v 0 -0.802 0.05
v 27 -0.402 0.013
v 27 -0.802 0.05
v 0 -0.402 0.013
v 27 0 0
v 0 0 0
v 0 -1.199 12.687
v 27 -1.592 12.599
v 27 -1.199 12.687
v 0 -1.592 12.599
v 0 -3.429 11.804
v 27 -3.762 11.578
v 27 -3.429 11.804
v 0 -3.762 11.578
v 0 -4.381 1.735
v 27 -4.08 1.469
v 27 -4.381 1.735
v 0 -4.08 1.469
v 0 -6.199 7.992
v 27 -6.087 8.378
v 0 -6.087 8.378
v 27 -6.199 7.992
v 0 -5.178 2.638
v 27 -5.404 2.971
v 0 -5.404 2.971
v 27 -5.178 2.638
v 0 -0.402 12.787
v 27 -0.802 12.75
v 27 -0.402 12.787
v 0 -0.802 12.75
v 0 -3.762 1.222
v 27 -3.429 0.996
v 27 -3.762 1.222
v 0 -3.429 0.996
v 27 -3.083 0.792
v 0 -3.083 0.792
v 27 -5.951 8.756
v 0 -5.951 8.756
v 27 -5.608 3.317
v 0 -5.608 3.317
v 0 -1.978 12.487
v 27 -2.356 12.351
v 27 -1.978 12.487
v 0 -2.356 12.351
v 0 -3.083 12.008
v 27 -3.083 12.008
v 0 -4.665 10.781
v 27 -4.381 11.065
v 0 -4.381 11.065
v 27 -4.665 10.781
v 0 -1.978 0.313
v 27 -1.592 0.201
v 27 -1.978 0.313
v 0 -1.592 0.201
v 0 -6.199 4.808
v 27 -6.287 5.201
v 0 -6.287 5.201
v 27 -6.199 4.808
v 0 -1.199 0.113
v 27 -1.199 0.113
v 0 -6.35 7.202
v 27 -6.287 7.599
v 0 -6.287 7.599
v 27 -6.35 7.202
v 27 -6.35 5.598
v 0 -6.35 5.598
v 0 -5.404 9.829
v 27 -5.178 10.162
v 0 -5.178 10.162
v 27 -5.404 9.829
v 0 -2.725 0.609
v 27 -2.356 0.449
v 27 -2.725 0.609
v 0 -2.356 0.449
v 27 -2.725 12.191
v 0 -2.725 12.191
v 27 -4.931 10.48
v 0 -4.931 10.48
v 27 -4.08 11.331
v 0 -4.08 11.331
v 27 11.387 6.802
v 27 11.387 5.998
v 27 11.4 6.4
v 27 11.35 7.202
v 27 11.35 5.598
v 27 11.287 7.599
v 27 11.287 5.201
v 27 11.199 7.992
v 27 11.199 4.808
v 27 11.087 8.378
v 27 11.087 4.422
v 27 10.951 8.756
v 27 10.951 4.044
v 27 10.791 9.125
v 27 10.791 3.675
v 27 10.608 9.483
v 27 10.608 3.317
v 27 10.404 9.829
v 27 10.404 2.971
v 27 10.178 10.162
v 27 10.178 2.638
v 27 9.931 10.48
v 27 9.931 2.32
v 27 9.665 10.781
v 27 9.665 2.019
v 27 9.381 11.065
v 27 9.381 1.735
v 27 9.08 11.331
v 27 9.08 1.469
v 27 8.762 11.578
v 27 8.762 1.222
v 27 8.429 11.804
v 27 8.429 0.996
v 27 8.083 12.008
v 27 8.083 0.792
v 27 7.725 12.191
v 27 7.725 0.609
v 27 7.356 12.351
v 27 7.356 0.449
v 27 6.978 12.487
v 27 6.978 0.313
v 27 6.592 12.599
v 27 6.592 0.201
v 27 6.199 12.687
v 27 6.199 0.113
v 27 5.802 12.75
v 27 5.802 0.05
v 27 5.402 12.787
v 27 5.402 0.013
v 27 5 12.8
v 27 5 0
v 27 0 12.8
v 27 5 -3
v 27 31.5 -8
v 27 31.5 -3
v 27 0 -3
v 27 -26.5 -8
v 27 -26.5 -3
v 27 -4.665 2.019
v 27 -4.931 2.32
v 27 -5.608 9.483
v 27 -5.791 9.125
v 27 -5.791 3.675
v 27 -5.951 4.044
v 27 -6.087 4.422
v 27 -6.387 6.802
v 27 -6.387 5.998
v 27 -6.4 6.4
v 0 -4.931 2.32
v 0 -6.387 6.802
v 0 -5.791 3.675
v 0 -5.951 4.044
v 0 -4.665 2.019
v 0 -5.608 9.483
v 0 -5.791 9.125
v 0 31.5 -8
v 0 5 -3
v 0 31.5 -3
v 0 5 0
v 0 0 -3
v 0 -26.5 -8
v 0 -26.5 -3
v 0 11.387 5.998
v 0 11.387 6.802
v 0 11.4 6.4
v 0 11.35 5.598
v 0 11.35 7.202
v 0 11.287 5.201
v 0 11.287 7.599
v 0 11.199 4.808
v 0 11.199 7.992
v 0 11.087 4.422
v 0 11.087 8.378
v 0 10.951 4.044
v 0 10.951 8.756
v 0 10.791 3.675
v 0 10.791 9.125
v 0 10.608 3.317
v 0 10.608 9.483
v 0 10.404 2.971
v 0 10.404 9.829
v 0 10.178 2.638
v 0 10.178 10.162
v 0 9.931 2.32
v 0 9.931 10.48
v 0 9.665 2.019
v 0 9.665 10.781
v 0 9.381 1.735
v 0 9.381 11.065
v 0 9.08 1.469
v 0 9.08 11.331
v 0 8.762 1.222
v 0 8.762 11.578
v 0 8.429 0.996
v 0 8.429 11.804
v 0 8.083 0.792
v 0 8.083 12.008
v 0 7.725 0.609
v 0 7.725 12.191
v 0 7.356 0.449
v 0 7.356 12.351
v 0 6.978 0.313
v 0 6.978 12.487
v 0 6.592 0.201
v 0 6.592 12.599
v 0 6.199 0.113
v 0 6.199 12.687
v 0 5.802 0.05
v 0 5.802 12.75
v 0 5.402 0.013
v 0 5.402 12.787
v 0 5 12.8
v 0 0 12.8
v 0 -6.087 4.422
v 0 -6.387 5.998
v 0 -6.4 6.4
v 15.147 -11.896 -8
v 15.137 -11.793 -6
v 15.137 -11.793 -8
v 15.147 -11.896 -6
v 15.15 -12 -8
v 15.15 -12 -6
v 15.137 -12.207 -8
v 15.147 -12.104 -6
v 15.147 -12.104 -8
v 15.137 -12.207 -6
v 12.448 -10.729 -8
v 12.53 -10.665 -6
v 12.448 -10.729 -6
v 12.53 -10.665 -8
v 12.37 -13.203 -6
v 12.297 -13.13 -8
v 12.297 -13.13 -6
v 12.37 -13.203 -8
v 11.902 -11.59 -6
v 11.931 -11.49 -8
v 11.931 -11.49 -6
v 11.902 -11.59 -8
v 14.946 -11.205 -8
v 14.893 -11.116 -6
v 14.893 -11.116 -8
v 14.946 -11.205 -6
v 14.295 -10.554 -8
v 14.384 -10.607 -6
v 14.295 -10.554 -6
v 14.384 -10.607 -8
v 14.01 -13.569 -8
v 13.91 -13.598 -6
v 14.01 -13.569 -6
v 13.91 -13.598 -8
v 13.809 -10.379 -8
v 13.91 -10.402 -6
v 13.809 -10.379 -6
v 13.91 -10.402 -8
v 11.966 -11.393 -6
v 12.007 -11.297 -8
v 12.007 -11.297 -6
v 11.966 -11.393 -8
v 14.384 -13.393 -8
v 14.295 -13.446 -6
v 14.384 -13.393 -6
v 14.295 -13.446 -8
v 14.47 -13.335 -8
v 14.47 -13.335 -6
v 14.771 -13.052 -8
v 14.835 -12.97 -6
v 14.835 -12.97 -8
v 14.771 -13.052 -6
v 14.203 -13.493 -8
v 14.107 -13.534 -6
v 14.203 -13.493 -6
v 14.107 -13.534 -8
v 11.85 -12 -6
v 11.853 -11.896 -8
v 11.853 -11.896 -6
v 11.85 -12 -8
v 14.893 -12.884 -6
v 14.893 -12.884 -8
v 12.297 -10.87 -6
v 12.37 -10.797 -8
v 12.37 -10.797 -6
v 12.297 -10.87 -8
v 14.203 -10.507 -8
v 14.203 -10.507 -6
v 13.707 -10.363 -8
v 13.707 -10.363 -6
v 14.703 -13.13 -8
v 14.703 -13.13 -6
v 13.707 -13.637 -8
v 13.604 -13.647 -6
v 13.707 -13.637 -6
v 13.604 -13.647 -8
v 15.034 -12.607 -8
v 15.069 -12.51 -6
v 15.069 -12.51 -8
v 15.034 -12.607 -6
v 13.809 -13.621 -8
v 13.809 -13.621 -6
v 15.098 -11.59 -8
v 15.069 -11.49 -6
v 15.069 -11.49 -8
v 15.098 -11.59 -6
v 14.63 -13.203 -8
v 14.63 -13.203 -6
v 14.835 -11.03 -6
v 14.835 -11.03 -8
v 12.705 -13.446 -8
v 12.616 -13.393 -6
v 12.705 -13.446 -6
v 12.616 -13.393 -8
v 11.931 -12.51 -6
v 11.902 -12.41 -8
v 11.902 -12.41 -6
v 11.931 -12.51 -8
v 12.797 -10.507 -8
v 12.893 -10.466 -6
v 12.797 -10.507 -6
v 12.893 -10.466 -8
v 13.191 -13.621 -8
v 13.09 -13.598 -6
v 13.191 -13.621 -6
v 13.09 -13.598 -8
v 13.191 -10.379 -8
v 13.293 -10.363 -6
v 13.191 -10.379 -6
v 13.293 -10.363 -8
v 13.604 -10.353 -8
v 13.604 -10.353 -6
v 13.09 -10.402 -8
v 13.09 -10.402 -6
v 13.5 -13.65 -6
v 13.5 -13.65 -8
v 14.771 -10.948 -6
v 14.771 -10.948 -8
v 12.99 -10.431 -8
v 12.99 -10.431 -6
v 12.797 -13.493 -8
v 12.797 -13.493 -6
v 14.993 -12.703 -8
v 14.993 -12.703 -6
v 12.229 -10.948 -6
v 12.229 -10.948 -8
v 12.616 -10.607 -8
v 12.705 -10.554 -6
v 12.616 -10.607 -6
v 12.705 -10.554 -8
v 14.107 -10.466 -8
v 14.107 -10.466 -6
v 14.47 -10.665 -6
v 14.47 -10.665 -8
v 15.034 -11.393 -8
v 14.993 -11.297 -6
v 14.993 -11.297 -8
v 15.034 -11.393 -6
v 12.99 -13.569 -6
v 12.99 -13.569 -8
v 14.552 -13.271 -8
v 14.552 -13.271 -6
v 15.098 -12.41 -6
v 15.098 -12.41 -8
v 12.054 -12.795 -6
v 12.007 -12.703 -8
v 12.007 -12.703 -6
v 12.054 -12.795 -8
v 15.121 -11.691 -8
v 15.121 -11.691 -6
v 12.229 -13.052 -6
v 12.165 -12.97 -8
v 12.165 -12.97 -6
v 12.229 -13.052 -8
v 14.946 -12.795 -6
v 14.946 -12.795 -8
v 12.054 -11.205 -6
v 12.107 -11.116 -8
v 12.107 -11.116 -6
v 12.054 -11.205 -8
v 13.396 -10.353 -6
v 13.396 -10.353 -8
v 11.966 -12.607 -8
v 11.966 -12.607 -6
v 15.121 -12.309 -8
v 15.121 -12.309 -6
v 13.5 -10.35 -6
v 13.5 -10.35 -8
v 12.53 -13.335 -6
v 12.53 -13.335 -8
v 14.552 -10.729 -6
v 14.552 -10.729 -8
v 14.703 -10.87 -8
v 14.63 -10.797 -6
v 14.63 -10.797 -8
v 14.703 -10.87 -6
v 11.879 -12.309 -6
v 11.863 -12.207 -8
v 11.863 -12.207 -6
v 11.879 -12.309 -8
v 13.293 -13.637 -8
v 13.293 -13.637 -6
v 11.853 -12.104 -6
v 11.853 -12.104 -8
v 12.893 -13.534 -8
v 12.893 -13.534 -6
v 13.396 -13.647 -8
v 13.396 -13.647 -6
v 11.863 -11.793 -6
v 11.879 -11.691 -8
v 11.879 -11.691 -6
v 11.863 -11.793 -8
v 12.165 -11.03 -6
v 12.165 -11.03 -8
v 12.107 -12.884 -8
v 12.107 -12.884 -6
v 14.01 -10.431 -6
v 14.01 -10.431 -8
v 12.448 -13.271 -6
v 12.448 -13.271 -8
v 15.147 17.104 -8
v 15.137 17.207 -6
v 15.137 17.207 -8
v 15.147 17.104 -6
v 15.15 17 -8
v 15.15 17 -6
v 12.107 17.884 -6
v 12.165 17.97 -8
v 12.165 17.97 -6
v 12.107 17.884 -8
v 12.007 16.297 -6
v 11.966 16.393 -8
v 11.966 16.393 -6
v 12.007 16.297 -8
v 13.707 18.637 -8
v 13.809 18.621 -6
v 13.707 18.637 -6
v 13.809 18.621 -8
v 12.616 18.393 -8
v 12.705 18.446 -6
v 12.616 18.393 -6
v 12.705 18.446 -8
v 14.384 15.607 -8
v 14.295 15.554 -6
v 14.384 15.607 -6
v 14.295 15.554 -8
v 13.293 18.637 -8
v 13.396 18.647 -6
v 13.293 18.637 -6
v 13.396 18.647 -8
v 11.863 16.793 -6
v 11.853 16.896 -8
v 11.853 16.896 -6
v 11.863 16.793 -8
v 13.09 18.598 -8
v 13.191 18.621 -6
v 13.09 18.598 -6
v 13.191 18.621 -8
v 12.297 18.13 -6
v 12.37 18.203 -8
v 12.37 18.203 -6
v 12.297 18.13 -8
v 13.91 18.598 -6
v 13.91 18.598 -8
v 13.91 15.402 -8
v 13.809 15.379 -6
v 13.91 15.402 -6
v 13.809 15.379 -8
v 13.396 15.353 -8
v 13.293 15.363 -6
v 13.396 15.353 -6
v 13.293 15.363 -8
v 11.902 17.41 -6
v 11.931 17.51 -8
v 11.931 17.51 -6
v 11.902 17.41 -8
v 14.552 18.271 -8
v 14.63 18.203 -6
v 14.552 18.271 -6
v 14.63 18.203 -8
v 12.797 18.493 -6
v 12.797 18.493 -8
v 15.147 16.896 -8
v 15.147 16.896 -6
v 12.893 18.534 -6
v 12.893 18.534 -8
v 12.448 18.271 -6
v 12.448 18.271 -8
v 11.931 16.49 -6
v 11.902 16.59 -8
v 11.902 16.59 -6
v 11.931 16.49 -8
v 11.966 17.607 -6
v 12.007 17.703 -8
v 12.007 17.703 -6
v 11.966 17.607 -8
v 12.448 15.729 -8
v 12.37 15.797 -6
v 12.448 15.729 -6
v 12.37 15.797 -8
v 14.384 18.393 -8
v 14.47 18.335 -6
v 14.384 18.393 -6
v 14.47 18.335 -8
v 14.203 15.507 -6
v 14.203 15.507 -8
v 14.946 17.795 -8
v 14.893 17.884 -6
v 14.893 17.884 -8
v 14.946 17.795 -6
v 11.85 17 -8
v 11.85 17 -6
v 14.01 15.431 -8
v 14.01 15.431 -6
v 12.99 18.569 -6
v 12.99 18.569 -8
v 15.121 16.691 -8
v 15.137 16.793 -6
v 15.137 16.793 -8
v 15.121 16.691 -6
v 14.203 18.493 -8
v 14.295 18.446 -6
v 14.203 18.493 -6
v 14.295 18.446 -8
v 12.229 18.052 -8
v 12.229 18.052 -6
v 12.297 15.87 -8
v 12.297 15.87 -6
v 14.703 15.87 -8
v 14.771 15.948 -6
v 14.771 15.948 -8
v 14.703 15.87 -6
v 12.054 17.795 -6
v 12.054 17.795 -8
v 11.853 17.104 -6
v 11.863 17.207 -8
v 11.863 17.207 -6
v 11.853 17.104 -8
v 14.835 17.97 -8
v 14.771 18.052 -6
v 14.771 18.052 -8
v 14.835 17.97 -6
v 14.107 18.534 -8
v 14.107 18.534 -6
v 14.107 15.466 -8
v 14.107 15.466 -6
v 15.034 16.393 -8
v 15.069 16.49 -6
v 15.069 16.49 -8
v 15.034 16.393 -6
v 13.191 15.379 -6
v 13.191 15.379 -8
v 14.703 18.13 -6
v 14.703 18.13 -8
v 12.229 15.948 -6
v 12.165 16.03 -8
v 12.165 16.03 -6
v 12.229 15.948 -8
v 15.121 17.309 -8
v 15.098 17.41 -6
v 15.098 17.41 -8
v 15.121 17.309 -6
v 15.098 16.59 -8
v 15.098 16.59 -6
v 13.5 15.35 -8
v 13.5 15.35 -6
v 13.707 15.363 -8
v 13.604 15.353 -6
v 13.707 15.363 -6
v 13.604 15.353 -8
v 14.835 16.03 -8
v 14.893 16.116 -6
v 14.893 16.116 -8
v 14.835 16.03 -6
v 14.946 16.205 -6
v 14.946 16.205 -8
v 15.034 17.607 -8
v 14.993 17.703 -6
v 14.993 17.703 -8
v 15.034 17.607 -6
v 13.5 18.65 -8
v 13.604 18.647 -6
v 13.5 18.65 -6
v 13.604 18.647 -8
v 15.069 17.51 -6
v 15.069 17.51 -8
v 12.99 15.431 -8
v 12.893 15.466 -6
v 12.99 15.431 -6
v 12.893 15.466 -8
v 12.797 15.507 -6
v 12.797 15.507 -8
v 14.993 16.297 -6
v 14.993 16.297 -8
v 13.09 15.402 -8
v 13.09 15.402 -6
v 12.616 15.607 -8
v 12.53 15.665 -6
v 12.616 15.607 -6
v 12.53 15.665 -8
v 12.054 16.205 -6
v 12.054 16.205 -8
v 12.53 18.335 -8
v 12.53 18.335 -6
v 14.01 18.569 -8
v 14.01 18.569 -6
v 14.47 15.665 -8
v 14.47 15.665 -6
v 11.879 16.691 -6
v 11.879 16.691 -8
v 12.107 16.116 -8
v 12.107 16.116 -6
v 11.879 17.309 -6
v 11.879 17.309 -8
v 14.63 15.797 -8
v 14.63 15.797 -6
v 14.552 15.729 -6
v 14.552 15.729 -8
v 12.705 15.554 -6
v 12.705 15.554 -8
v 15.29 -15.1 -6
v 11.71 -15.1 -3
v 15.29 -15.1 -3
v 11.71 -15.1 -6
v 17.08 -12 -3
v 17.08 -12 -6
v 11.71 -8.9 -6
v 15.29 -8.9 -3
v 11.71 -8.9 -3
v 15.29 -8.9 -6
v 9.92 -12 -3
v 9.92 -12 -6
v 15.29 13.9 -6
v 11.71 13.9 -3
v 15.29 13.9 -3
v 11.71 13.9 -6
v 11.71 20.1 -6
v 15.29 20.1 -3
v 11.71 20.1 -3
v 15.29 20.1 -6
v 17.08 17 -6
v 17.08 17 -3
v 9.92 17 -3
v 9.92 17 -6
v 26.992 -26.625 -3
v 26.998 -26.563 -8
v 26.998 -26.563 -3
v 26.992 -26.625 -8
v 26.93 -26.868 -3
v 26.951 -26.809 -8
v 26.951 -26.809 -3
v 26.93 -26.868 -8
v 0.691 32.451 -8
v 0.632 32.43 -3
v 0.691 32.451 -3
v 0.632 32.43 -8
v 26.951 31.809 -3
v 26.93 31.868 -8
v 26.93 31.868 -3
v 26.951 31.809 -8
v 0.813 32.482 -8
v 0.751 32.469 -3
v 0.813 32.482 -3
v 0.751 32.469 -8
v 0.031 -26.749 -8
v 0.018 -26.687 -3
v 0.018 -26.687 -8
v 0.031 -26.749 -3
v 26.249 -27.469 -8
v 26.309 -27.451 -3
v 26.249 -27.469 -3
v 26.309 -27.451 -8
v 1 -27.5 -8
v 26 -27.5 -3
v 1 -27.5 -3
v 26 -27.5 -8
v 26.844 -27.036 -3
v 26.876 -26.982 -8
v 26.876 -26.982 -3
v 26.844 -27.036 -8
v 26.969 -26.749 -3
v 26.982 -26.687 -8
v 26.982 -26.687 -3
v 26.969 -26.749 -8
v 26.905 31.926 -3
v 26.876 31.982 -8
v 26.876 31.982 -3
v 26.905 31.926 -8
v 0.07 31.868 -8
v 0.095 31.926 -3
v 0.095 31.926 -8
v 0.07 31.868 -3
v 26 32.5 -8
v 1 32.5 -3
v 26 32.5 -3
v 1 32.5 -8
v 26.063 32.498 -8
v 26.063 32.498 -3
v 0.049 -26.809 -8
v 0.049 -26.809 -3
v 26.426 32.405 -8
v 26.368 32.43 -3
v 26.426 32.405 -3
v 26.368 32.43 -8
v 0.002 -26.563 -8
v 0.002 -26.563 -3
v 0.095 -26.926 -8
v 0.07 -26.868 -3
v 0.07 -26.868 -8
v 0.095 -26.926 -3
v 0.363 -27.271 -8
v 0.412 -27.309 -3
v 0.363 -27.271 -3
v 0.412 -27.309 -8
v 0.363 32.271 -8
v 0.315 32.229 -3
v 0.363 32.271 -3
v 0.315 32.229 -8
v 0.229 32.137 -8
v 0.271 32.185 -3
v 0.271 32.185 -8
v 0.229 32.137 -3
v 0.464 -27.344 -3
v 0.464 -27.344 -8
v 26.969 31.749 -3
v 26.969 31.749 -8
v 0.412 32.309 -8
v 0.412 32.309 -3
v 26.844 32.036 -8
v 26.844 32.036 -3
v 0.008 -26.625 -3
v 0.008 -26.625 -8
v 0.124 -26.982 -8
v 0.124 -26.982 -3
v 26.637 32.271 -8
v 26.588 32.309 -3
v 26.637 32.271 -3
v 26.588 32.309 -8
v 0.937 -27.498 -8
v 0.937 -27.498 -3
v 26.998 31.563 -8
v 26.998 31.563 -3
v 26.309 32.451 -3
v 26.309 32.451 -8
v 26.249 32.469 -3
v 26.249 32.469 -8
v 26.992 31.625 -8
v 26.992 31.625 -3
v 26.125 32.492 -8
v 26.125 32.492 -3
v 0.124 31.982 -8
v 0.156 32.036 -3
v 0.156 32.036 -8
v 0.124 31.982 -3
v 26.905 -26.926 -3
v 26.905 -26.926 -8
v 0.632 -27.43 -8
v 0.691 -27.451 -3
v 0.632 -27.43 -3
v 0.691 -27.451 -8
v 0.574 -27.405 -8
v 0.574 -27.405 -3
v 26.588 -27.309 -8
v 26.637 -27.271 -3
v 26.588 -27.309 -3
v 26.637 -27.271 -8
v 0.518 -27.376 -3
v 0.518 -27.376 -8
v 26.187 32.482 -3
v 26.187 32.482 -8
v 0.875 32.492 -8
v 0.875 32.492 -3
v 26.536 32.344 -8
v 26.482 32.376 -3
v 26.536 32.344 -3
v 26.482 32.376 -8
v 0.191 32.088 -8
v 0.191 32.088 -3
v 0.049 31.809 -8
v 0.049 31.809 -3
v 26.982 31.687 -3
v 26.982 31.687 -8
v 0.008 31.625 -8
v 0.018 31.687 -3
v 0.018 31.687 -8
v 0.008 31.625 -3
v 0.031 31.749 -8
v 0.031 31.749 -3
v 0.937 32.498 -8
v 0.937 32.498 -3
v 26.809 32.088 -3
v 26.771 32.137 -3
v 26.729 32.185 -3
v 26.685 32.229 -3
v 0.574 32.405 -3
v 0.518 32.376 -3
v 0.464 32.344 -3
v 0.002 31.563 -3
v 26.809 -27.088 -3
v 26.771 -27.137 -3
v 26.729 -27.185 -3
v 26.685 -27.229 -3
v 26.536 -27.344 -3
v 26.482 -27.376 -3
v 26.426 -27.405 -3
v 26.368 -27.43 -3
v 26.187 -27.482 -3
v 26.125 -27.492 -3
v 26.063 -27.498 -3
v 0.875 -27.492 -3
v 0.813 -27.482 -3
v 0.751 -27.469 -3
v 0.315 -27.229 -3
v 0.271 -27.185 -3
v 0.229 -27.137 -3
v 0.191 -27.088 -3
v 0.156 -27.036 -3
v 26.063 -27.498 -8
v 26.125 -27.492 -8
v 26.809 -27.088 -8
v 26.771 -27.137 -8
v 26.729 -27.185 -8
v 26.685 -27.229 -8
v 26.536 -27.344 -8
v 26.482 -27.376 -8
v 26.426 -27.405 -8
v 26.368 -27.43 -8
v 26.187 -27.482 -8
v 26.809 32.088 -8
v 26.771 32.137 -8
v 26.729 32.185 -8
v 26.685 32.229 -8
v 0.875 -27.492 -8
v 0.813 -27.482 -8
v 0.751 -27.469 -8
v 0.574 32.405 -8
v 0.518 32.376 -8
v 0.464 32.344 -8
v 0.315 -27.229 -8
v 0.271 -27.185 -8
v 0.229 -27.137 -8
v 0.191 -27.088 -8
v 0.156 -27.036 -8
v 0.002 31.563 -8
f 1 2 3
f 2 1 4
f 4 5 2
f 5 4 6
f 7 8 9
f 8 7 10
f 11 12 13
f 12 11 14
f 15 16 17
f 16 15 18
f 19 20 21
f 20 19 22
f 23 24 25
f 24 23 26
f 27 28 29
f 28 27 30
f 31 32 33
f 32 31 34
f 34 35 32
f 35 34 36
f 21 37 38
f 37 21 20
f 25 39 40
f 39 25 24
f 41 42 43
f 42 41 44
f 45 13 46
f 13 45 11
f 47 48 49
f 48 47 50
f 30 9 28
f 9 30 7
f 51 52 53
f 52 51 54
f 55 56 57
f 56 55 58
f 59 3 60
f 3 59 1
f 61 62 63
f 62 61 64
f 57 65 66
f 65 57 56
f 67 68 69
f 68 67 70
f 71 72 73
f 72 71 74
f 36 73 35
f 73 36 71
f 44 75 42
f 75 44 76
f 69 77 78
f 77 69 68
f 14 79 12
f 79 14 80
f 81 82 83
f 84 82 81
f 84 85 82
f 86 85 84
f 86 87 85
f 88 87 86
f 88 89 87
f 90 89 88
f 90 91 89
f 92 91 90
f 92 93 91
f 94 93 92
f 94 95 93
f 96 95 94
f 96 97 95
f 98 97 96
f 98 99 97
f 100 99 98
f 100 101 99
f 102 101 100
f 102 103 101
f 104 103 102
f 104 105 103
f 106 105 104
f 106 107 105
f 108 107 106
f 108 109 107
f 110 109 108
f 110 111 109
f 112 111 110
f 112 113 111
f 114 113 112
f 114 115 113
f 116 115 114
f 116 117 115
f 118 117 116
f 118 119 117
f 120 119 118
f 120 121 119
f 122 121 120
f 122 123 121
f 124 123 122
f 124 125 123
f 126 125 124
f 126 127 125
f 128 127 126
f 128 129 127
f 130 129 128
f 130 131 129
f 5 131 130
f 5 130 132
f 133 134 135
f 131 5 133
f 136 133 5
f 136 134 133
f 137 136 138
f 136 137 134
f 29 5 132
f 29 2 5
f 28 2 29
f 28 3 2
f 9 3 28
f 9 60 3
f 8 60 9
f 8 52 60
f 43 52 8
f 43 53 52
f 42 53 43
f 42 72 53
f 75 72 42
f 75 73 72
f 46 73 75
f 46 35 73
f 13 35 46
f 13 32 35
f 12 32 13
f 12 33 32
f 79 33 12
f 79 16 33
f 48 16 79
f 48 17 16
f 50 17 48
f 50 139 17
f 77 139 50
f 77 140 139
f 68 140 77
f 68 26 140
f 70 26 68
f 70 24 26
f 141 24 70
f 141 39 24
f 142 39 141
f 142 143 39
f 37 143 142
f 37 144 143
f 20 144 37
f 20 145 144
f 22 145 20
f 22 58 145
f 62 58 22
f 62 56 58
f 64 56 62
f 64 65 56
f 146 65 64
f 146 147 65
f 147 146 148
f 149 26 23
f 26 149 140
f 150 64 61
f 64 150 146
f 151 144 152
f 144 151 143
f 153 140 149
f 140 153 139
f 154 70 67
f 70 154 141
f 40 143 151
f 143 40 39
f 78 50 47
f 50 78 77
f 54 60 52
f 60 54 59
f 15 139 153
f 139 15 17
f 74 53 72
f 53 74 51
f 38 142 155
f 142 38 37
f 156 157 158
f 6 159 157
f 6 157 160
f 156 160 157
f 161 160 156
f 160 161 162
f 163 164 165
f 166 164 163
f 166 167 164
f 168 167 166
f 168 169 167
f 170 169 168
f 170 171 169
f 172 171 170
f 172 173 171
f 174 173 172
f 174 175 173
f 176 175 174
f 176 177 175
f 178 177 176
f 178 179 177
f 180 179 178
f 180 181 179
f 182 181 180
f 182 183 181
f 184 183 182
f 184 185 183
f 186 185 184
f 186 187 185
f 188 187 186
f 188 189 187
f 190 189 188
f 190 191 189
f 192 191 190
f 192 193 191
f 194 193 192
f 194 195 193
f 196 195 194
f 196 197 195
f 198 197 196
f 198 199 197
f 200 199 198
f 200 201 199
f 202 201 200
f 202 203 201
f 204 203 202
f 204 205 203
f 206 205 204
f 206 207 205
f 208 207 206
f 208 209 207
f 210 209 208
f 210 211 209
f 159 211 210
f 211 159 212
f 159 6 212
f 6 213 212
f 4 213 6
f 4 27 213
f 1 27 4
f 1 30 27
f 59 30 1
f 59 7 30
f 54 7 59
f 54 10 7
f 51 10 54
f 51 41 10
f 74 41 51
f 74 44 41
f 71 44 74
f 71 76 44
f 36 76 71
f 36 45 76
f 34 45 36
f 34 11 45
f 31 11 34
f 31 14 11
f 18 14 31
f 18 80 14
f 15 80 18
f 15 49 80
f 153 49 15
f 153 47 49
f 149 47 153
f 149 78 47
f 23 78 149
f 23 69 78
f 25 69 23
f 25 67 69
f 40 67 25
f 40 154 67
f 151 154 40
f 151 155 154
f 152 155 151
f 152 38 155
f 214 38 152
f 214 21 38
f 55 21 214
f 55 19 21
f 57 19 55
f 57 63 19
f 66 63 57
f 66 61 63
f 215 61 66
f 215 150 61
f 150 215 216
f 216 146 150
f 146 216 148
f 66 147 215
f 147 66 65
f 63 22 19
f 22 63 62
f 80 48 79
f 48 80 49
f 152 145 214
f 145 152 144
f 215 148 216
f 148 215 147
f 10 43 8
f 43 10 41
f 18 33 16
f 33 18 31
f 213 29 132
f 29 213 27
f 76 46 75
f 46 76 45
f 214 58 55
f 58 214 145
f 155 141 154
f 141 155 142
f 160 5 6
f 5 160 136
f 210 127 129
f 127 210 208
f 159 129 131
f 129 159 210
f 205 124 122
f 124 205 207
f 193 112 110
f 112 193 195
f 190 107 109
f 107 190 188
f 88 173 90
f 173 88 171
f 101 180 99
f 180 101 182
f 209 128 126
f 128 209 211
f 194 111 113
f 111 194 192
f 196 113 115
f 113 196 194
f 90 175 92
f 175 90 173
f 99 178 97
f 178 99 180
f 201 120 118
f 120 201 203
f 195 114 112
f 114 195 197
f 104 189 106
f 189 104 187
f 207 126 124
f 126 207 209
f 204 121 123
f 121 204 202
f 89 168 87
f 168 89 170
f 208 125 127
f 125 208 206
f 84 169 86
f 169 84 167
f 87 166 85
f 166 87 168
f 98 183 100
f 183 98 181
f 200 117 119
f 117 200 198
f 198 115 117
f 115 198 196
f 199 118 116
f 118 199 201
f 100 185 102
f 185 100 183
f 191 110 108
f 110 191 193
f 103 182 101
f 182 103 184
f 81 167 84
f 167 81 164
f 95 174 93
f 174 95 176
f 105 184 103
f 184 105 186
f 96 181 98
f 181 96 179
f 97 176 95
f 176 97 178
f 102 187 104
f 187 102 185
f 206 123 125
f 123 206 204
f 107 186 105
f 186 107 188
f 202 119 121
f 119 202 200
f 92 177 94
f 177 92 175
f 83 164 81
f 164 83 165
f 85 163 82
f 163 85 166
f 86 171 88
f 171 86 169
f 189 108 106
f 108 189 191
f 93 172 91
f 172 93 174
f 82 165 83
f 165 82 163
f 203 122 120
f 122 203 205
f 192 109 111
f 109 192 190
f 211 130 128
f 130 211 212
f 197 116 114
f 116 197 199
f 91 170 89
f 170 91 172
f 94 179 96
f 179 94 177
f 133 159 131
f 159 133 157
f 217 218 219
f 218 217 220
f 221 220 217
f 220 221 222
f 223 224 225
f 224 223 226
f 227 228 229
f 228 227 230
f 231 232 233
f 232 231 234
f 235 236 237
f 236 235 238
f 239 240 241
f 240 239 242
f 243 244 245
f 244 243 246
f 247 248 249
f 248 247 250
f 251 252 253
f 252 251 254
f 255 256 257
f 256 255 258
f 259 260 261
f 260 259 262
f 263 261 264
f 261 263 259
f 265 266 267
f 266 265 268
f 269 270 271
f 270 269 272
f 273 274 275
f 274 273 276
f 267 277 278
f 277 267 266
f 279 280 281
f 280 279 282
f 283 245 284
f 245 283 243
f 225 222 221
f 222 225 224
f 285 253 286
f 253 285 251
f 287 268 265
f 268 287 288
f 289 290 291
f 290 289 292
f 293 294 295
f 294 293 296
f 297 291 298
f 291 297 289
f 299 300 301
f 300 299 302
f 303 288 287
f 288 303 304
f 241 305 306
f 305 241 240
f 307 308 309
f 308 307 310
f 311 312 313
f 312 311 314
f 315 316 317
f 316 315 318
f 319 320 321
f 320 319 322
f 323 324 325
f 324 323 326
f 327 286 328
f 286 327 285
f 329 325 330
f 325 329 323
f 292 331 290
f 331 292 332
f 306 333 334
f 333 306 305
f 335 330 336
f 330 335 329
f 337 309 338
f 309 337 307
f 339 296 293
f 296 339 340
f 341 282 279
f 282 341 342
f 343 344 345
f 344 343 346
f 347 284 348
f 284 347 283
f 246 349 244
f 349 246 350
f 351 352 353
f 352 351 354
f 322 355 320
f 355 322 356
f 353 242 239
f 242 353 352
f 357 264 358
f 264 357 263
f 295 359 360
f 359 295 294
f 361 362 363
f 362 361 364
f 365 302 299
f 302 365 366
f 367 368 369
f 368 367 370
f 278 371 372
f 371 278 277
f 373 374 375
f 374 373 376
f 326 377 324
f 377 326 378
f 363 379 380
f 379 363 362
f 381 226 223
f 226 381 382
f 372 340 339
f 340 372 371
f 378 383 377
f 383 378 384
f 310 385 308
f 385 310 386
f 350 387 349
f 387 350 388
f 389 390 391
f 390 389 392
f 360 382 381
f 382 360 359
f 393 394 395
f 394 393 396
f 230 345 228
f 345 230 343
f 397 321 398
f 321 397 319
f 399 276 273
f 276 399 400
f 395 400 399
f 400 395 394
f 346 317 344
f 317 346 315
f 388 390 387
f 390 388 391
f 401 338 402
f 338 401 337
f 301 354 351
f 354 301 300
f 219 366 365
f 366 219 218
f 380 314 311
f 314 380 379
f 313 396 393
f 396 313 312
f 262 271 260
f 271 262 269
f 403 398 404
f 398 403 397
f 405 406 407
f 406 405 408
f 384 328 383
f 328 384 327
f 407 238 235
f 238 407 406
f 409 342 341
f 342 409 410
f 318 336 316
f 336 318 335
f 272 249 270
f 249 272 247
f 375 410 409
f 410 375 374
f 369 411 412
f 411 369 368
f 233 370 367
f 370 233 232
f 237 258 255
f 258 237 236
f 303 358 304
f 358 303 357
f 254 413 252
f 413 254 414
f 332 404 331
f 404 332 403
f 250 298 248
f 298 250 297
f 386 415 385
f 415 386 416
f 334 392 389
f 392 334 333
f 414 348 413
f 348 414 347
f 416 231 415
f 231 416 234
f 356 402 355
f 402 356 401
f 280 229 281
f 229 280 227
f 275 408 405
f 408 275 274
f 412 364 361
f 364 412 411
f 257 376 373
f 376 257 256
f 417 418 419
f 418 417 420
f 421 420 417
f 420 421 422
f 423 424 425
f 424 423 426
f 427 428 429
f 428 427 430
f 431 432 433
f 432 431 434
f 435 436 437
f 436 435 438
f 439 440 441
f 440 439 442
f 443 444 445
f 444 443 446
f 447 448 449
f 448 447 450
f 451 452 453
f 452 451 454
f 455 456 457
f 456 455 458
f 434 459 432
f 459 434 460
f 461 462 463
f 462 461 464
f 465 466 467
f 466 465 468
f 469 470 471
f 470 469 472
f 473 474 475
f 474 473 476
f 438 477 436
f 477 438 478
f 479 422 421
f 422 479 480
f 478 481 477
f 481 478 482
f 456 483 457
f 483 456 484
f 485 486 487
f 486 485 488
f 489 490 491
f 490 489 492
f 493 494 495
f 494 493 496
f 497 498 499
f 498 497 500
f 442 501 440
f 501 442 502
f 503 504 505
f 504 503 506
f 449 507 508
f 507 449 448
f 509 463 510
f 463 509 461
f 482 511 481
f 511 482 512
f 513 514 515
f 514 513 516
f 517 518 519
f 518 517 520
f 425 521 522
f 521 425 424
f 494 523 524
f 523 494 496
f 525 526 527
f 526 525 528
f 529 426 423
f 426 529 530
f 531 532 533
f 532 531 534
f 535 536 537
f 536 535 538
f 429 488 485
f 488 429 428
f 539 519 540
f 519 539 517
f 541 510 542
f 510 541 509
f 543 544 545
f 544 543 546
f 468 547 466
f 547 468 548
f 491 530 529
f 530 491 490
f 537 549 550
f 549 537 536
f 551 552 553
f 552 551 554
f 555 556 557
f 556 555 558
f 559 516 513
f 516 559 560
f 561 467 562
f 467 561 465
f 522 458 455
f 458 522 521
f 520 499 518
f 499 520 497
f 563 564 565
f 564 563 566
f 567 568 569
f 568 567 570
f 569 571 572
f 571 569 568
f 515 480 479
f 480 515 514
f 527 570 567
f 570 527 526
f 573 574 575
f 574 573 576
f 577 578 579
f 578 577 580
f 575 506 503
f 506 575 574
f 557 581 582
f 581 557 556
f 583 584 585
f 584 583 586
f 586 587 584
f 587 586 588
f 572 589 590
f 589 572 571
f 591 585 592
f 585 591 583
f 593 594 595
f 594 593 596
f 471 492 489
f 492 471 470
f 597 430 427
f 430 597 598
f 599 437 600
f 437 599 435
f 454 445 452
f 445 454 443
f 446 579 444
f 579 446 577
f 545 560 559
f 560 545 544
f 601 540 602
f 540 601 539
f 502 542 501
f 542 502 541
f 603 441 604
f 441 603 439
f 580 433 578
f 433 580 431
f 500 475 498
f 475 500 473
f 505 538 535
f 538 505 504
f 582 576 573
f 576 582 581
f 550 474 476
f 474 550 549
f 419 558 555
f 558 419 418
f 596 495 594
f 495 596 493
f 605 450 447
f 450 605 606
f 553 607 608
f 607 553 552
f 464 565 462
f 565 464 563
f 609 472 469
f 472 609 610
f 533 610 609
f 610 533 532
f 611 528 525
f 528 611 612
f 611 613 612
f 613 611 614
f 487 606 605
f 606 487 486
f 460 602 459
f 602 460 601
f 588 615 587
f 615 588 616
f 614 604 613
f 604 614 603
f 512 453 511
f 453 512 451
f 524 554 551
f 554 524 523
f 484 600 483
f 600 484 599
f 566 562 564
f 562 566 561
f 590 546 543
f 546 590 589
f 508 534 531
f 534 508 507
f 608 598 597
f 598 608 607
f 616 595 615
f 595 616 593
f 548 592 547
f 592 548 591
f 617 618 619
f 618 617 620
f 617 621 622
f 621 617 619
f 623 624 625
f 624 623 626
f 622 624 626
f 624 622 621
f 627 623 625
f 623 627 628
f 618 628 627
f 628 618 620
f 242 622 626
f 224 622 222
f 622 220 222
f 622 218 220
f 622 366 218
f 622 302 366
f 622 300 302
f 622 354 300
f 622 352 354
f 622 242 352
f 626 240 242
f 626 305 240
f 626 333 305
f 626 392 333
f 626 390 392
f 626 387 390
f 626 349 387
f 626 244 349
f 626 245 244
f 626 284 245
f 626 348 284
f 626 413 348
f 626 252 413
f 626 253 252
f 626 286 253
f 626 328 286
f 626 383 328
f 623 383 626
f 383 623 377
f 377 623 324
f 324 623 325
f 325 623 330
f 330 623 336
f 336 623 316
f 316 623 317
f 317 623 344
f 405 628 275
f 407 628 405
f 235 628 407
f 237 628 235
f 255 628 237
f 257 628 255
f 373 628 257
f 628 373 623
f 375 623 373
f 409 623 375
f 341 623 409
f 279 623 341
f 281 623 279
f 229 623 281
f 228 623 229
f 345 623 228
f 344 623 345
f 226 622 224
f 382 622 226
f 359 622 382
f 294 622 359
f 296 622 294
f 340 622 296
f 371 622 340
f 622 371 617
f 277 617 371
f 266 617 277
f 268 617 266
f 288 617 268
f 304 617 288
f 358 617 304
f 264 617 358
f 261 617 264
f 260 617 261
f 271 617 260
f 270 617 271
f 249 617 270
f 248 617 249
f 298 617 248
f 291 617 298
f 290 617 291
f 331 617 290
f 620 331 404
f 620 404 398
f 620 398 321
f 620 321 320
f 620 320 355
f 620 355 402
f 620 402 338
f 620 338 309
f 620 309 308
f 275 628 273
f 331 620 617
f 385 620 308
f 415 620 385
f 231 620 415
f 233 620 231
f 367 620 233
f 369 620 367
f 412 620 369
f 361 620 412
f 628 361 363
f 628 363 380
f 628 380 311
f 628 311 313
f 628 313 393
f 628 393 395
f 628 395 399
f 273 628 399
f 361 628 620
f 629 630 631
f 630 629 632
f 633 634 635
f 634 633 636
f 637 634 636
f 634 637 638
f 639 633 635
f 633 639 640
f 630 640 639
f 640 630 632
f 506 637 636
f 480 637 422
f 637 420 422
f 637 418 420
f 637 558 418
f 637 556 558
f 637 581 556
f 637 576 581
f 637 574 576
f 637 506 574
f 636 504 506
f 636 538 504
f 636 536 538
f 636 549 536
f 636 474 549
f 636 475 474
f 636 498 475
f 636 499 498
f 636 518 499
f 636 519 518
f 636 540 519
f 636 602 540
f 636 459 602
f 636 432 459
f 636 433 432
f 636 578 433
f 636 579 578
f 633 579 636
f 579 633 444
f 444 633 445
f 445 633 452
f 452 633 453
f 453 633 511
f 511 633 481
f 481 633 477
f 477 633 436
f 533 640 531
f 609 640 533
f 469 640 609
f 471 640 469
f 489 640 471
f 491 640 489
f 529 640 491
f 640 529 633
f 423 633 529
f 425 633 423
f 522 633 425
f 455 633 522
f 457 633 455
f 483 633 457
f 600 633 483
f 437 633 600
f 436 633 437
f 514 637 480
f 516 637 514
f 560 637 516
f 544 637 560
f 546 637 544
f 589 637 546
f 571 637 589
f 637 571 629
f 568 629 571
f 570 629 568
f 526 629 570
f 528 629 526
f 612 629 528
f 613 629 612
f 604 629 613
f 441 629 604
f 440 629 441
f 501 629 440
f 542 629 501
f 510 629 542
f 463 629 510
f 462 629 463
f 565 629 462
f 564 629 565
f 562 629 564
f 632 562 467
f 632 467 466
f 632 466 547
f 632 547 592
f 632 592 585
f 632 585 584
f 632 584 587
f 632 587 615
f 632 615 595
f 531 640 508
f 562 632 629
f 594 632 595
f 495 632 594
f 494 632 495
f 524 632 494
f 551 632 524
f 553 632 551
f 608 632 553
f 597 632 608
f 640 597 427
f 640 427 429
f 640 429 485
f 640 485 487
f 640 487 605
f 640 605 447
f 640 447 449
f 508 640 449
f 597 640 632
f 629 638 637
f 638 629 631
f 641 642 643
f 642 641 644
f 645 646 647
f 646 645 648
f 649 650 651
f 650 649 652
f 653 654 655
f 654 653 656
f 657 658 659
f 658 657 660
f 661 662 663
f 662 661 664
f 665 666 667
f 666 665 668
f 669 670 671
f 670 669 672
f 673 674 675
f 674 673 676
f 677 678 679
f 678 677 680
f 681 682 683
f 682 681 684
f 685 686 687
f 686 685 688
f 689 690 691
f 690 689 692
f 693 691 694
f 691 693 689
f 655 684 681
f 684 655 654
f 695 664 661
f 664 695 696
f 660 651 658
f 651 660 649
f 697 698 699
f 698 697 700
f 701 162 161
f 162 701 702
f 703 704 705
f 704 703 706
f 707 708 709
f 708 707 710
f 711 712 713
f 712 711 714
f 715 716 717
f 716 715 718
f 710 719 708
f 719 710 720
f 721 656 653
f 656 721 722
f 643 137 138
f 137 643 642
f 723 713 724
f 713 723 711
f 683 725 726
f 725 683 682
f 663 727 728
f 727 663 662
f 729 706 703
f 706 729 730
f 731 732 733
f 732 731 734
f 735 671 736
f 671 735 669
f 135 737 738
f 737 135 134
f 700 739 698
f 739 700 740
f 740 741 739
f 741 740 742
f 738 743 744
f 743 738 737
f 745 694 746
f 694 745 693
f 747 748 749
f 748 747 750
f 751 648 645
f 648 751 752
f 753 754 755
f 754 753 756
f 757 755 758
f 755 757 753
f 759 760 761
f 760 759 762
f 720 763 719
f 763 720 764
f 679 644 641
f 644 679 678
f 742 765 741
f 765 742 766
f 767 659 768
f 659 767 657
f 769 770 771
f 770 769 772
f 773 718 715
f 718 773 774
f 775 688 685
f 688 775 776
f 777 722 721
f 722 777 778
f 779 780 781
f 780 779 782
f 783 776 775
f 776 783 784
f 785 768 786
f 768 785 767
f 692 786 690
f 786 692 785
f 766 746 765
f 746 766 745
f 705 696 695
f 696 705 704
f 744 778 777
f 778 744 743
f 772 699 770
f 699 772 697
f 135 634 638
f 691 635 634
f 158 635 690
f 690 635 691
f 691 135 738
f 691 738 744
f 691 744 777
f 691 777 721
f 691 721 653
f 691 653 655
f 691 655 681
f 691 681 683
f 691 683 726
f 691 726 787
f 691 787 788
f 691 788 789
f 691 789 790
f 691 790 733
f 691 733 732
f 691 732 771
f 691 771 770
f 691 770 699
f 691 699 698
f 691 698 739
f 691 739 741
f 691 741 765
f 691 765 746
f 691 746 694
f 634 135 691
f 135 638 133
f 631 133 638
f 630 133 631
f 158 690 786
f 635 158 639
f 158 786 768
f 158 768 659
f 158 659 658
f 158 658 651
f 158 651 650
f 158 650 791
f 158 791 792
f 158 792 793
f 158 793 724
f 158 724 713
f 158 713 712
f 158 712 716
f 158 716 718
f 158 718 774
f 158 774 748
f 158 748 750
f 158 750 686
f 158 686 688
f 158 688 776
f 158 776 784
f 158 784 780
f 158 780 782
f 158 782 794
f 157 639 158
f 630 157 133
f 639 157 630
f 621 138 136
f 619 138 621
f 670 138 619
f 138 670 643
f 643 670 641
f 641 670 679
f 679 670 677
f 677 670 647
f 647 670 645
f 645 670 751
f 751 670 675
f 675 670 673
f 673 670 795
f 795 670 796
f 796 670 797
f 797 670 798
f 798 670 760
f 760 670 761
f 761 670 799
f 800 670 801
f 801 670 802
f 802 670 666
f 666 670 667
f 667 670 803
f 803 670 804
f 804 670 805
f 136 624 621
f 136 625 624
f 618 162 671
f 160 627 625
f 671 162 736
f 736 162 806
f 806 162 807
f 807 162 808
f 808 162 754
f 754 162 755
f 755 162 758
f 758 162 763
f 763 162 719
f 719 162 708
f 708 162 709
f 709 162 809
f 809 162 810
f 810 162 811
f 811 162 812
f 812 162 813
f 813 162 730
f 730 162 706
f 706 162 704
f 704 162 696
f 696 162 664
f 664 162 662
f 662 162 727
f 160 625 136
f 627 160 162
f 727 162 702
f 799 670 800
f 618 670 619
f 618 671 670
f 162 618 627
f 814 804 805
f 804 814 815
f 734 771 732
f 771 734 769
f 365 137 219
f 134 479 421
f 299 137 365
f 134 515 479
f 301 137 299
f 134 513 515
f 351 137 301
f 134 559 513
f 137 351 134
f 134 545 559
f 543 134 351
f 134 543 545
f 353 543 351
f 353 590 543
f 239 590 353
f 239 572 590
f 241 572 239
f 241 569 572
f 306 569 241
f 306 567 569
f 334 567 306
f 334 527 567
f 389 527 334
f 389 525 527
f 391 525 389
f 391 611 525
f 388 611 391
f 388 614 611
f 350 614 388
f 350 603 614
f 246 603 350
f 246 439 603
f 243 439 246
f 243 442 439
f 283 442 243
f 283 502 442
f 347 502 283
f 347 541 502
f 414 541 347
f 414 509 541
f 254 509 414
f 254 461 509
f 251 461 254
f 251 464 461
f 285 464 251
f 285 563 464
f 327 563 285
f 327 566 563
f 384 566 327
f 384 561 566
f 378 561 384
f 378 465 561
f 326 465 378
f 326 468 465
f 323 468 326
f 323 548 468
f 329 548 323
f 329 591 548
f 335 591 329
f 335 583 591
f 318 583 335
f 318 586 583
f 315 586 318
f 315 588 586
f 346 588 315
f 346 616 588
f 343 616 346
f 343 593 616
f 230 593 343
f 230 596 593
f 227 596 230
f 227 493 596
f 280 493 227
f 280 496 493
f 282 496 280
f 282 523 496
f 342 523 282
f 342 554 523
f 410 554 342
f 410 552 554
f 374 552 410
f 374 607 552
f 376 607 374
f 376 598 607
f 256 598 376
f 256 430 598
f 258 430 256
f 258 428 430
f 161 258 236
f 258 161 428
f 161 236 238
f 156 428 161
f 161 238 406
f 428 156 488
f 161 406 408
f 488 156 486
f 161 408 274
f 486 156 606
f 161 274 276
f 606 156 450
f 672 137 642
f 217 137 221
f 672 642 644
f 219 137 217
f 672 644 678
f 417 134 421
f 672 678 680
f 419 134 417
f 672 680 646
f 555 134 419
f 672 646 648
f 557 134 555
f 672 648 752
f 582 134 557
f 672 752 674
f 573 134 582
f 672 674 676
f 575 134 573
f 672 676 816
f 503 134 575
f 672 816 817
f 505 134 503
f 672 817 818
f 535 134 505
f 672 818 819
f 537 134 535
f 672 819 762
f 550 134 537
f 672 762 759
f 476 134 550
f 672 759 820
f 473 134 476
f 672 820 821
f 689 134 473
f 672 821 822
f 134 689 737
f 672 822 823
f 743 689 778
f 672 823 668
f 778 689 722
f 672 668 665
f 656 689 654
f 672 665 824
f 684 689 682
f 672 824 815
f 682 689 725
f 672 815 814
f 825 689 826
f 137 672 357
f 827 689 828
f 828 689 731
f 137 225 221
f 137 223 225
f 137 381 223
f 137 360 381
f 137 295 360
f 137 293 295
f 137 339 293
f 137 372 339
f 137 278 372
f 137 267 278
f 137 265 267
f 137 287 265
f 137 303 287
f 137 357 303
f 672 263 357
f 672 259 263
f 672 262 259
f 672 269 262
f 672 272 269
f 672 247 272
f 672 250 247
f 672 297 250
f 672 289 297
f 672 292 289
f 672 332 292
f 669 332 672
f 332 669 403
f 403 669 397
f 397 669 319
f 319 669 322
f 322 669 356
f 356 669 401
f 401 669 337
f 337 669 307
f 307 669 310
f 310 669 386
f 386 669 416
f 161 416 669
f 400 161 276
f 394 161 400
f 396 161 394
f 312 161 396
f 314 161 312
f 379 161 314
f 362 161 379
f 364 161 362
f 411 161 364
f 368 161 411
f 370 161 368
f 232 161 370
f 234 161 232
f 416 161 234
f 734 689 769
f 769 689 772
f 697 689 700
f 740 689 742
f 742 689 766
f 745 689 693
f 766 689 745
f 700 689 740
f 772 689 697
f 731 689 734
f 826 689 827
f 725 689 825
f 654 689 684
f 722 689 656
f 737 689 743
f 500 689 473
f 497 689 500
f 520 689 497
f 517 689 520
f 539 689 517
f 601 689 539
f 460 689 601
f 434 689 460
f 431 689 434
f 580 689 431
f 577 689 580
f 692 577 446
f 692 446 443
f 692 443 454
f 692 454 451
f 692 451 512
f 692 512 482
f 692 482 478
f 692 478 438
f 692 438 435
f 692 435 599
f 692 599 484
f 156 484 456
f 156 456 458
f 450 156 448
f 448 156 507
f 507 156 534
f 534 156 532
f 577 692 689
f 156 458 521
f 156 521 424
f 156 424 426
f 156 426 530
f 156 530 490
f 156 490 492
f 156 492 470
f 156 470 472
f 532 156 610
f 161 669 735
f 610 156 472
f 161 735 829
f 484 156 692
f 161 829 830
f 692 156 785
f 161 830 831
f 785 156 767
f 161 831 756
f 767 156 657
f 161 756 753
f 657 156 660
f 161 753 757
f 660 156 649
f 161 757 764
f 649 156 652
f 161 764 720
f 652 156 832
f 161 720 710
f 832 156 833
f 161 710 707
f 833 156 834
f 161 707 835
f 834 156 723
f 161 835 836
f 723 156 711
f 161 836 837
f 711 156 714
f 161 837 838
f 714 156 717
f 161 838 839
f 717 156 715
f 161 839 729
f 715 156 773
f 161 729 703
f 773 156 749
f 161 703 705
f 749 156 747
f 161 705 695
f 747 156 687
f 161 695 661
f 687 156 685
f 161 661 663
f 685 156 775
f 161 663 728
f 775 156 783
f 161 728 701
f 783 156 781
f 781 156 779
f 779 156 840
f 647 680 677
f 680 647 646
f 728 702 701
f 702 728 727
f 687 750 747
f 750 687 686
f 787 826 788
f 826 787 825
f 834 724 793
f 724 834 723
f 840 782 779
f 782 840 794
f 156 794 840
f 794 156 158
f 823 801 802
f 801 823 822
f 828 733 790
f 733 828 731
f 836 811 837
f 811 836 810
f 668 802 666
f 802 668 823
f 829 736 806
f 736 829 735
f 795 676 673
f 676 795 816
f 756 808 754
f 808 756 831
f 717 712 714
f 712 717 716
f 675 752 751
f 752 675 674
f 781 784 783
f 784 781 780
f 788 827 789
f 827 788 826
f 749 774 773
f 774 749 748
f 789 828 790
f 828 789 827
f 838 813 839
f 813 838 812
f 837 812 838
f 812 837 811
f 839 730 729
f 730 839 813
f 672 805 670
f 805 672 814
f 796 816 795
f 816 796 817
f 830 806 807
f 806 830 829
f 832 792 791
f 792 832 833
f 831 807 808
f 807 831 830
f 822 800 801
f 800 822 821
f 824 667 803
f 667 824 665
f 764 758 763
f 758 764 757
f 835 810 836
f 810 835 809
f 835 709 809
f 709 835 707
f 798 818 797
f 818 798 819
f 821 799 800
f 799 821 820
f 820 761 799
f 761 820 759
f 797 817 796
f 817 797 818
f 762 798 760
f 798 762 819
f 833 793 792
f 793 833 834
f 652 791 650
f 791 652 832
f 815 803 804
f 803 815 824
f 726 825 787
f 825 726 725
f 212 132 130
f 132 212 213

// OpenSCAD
// =========================
// Parametric Settings
// =========================
length = 27;        // overall length
width  = 5;        // cuboid width
height = 12.8;        // cuboid height
fillet = 10;         // edge fillet radius
$fn = 100;            // smoothness

// Cylinder radius follows cuboid height
cyl_radius = height/2;
slot_thickness = 3;
bar_width = 60;
bar_d = 27;
bar_thickness = 5;

// Base plate
plate_w      = bar_d;
plate_d      = bar_width;
plate_thick  = bar_thickness;

// Computed centering offsets for the red plate
plate_x_offset = length/2 - (bar_width - width)/2;
plate_y_offset = width/2  - (length - bar_d)/2;


// Mounting holes (M3)
hole_d       = 3.3;
hole_spacing = 29;      // match receiver flange spacing
nut_d        = 6.2;     // M3 hex nut circle diameter
nut_h        = 2.6;

// =========================
// Half Cylinder Module
// =========================
module half_cylinder(len, r){
    intersection(){
        cylinder(h=len, r=r, $fn=$fn);
        translate([-r,0,0])
            cube([2*r,r,len]);
    }
}
// =========================
// Core Shape (before fillets)
// =========================
module base_shape(){

    union(){
        // main cuboid
        cube([length, width, height]);
        // first half-cylinder
        translate([length,0,height/2])
            rotate([180,90,0])
            half_cylinder(length, cyl_radius);
        // opposite half-cylinder
        translate([0,width,height/2])
            rotate([180,90,180])
            half_cylinder(length, cyl_radius);
        // slot
        translate([0,0,-slot_thickness])
            cube([length, width, slot_thickness]);

        // bottom bar 
        translate([(((bar_width - width)) / 2) + plate_x_offset,
                   ((length - bar_d) / 2)       + plate_y_offset,
                   -(slot_thickness+bar_thickness)])
            difference() {
            color("red") hull() {
                for (sx = [-1,1], sy = [-1,1])
                    translate([sx*(plate_w/2-1), sy*(plate_d/2-1), 0])
                        cylinder(r=1, h=plate_thick);
            }
        // ── M3 bolt holes through plate ─────────────────────
        for (sx = [-1,1])
            translate([0, sx * hole_spacing/2, -1])
                cylinder(d=hole_d, h=plate_thick + 2);

        // ── Hex nut traps (from bottom) ──────────────────────
        for (sx = [-1,1])
            translate([0, sx * hole_spacing/2,2])
                cylinder(d=nut_d/cos(30), h=nut_h + 1, $fn=6);
    }

    }
}
base_shape();
